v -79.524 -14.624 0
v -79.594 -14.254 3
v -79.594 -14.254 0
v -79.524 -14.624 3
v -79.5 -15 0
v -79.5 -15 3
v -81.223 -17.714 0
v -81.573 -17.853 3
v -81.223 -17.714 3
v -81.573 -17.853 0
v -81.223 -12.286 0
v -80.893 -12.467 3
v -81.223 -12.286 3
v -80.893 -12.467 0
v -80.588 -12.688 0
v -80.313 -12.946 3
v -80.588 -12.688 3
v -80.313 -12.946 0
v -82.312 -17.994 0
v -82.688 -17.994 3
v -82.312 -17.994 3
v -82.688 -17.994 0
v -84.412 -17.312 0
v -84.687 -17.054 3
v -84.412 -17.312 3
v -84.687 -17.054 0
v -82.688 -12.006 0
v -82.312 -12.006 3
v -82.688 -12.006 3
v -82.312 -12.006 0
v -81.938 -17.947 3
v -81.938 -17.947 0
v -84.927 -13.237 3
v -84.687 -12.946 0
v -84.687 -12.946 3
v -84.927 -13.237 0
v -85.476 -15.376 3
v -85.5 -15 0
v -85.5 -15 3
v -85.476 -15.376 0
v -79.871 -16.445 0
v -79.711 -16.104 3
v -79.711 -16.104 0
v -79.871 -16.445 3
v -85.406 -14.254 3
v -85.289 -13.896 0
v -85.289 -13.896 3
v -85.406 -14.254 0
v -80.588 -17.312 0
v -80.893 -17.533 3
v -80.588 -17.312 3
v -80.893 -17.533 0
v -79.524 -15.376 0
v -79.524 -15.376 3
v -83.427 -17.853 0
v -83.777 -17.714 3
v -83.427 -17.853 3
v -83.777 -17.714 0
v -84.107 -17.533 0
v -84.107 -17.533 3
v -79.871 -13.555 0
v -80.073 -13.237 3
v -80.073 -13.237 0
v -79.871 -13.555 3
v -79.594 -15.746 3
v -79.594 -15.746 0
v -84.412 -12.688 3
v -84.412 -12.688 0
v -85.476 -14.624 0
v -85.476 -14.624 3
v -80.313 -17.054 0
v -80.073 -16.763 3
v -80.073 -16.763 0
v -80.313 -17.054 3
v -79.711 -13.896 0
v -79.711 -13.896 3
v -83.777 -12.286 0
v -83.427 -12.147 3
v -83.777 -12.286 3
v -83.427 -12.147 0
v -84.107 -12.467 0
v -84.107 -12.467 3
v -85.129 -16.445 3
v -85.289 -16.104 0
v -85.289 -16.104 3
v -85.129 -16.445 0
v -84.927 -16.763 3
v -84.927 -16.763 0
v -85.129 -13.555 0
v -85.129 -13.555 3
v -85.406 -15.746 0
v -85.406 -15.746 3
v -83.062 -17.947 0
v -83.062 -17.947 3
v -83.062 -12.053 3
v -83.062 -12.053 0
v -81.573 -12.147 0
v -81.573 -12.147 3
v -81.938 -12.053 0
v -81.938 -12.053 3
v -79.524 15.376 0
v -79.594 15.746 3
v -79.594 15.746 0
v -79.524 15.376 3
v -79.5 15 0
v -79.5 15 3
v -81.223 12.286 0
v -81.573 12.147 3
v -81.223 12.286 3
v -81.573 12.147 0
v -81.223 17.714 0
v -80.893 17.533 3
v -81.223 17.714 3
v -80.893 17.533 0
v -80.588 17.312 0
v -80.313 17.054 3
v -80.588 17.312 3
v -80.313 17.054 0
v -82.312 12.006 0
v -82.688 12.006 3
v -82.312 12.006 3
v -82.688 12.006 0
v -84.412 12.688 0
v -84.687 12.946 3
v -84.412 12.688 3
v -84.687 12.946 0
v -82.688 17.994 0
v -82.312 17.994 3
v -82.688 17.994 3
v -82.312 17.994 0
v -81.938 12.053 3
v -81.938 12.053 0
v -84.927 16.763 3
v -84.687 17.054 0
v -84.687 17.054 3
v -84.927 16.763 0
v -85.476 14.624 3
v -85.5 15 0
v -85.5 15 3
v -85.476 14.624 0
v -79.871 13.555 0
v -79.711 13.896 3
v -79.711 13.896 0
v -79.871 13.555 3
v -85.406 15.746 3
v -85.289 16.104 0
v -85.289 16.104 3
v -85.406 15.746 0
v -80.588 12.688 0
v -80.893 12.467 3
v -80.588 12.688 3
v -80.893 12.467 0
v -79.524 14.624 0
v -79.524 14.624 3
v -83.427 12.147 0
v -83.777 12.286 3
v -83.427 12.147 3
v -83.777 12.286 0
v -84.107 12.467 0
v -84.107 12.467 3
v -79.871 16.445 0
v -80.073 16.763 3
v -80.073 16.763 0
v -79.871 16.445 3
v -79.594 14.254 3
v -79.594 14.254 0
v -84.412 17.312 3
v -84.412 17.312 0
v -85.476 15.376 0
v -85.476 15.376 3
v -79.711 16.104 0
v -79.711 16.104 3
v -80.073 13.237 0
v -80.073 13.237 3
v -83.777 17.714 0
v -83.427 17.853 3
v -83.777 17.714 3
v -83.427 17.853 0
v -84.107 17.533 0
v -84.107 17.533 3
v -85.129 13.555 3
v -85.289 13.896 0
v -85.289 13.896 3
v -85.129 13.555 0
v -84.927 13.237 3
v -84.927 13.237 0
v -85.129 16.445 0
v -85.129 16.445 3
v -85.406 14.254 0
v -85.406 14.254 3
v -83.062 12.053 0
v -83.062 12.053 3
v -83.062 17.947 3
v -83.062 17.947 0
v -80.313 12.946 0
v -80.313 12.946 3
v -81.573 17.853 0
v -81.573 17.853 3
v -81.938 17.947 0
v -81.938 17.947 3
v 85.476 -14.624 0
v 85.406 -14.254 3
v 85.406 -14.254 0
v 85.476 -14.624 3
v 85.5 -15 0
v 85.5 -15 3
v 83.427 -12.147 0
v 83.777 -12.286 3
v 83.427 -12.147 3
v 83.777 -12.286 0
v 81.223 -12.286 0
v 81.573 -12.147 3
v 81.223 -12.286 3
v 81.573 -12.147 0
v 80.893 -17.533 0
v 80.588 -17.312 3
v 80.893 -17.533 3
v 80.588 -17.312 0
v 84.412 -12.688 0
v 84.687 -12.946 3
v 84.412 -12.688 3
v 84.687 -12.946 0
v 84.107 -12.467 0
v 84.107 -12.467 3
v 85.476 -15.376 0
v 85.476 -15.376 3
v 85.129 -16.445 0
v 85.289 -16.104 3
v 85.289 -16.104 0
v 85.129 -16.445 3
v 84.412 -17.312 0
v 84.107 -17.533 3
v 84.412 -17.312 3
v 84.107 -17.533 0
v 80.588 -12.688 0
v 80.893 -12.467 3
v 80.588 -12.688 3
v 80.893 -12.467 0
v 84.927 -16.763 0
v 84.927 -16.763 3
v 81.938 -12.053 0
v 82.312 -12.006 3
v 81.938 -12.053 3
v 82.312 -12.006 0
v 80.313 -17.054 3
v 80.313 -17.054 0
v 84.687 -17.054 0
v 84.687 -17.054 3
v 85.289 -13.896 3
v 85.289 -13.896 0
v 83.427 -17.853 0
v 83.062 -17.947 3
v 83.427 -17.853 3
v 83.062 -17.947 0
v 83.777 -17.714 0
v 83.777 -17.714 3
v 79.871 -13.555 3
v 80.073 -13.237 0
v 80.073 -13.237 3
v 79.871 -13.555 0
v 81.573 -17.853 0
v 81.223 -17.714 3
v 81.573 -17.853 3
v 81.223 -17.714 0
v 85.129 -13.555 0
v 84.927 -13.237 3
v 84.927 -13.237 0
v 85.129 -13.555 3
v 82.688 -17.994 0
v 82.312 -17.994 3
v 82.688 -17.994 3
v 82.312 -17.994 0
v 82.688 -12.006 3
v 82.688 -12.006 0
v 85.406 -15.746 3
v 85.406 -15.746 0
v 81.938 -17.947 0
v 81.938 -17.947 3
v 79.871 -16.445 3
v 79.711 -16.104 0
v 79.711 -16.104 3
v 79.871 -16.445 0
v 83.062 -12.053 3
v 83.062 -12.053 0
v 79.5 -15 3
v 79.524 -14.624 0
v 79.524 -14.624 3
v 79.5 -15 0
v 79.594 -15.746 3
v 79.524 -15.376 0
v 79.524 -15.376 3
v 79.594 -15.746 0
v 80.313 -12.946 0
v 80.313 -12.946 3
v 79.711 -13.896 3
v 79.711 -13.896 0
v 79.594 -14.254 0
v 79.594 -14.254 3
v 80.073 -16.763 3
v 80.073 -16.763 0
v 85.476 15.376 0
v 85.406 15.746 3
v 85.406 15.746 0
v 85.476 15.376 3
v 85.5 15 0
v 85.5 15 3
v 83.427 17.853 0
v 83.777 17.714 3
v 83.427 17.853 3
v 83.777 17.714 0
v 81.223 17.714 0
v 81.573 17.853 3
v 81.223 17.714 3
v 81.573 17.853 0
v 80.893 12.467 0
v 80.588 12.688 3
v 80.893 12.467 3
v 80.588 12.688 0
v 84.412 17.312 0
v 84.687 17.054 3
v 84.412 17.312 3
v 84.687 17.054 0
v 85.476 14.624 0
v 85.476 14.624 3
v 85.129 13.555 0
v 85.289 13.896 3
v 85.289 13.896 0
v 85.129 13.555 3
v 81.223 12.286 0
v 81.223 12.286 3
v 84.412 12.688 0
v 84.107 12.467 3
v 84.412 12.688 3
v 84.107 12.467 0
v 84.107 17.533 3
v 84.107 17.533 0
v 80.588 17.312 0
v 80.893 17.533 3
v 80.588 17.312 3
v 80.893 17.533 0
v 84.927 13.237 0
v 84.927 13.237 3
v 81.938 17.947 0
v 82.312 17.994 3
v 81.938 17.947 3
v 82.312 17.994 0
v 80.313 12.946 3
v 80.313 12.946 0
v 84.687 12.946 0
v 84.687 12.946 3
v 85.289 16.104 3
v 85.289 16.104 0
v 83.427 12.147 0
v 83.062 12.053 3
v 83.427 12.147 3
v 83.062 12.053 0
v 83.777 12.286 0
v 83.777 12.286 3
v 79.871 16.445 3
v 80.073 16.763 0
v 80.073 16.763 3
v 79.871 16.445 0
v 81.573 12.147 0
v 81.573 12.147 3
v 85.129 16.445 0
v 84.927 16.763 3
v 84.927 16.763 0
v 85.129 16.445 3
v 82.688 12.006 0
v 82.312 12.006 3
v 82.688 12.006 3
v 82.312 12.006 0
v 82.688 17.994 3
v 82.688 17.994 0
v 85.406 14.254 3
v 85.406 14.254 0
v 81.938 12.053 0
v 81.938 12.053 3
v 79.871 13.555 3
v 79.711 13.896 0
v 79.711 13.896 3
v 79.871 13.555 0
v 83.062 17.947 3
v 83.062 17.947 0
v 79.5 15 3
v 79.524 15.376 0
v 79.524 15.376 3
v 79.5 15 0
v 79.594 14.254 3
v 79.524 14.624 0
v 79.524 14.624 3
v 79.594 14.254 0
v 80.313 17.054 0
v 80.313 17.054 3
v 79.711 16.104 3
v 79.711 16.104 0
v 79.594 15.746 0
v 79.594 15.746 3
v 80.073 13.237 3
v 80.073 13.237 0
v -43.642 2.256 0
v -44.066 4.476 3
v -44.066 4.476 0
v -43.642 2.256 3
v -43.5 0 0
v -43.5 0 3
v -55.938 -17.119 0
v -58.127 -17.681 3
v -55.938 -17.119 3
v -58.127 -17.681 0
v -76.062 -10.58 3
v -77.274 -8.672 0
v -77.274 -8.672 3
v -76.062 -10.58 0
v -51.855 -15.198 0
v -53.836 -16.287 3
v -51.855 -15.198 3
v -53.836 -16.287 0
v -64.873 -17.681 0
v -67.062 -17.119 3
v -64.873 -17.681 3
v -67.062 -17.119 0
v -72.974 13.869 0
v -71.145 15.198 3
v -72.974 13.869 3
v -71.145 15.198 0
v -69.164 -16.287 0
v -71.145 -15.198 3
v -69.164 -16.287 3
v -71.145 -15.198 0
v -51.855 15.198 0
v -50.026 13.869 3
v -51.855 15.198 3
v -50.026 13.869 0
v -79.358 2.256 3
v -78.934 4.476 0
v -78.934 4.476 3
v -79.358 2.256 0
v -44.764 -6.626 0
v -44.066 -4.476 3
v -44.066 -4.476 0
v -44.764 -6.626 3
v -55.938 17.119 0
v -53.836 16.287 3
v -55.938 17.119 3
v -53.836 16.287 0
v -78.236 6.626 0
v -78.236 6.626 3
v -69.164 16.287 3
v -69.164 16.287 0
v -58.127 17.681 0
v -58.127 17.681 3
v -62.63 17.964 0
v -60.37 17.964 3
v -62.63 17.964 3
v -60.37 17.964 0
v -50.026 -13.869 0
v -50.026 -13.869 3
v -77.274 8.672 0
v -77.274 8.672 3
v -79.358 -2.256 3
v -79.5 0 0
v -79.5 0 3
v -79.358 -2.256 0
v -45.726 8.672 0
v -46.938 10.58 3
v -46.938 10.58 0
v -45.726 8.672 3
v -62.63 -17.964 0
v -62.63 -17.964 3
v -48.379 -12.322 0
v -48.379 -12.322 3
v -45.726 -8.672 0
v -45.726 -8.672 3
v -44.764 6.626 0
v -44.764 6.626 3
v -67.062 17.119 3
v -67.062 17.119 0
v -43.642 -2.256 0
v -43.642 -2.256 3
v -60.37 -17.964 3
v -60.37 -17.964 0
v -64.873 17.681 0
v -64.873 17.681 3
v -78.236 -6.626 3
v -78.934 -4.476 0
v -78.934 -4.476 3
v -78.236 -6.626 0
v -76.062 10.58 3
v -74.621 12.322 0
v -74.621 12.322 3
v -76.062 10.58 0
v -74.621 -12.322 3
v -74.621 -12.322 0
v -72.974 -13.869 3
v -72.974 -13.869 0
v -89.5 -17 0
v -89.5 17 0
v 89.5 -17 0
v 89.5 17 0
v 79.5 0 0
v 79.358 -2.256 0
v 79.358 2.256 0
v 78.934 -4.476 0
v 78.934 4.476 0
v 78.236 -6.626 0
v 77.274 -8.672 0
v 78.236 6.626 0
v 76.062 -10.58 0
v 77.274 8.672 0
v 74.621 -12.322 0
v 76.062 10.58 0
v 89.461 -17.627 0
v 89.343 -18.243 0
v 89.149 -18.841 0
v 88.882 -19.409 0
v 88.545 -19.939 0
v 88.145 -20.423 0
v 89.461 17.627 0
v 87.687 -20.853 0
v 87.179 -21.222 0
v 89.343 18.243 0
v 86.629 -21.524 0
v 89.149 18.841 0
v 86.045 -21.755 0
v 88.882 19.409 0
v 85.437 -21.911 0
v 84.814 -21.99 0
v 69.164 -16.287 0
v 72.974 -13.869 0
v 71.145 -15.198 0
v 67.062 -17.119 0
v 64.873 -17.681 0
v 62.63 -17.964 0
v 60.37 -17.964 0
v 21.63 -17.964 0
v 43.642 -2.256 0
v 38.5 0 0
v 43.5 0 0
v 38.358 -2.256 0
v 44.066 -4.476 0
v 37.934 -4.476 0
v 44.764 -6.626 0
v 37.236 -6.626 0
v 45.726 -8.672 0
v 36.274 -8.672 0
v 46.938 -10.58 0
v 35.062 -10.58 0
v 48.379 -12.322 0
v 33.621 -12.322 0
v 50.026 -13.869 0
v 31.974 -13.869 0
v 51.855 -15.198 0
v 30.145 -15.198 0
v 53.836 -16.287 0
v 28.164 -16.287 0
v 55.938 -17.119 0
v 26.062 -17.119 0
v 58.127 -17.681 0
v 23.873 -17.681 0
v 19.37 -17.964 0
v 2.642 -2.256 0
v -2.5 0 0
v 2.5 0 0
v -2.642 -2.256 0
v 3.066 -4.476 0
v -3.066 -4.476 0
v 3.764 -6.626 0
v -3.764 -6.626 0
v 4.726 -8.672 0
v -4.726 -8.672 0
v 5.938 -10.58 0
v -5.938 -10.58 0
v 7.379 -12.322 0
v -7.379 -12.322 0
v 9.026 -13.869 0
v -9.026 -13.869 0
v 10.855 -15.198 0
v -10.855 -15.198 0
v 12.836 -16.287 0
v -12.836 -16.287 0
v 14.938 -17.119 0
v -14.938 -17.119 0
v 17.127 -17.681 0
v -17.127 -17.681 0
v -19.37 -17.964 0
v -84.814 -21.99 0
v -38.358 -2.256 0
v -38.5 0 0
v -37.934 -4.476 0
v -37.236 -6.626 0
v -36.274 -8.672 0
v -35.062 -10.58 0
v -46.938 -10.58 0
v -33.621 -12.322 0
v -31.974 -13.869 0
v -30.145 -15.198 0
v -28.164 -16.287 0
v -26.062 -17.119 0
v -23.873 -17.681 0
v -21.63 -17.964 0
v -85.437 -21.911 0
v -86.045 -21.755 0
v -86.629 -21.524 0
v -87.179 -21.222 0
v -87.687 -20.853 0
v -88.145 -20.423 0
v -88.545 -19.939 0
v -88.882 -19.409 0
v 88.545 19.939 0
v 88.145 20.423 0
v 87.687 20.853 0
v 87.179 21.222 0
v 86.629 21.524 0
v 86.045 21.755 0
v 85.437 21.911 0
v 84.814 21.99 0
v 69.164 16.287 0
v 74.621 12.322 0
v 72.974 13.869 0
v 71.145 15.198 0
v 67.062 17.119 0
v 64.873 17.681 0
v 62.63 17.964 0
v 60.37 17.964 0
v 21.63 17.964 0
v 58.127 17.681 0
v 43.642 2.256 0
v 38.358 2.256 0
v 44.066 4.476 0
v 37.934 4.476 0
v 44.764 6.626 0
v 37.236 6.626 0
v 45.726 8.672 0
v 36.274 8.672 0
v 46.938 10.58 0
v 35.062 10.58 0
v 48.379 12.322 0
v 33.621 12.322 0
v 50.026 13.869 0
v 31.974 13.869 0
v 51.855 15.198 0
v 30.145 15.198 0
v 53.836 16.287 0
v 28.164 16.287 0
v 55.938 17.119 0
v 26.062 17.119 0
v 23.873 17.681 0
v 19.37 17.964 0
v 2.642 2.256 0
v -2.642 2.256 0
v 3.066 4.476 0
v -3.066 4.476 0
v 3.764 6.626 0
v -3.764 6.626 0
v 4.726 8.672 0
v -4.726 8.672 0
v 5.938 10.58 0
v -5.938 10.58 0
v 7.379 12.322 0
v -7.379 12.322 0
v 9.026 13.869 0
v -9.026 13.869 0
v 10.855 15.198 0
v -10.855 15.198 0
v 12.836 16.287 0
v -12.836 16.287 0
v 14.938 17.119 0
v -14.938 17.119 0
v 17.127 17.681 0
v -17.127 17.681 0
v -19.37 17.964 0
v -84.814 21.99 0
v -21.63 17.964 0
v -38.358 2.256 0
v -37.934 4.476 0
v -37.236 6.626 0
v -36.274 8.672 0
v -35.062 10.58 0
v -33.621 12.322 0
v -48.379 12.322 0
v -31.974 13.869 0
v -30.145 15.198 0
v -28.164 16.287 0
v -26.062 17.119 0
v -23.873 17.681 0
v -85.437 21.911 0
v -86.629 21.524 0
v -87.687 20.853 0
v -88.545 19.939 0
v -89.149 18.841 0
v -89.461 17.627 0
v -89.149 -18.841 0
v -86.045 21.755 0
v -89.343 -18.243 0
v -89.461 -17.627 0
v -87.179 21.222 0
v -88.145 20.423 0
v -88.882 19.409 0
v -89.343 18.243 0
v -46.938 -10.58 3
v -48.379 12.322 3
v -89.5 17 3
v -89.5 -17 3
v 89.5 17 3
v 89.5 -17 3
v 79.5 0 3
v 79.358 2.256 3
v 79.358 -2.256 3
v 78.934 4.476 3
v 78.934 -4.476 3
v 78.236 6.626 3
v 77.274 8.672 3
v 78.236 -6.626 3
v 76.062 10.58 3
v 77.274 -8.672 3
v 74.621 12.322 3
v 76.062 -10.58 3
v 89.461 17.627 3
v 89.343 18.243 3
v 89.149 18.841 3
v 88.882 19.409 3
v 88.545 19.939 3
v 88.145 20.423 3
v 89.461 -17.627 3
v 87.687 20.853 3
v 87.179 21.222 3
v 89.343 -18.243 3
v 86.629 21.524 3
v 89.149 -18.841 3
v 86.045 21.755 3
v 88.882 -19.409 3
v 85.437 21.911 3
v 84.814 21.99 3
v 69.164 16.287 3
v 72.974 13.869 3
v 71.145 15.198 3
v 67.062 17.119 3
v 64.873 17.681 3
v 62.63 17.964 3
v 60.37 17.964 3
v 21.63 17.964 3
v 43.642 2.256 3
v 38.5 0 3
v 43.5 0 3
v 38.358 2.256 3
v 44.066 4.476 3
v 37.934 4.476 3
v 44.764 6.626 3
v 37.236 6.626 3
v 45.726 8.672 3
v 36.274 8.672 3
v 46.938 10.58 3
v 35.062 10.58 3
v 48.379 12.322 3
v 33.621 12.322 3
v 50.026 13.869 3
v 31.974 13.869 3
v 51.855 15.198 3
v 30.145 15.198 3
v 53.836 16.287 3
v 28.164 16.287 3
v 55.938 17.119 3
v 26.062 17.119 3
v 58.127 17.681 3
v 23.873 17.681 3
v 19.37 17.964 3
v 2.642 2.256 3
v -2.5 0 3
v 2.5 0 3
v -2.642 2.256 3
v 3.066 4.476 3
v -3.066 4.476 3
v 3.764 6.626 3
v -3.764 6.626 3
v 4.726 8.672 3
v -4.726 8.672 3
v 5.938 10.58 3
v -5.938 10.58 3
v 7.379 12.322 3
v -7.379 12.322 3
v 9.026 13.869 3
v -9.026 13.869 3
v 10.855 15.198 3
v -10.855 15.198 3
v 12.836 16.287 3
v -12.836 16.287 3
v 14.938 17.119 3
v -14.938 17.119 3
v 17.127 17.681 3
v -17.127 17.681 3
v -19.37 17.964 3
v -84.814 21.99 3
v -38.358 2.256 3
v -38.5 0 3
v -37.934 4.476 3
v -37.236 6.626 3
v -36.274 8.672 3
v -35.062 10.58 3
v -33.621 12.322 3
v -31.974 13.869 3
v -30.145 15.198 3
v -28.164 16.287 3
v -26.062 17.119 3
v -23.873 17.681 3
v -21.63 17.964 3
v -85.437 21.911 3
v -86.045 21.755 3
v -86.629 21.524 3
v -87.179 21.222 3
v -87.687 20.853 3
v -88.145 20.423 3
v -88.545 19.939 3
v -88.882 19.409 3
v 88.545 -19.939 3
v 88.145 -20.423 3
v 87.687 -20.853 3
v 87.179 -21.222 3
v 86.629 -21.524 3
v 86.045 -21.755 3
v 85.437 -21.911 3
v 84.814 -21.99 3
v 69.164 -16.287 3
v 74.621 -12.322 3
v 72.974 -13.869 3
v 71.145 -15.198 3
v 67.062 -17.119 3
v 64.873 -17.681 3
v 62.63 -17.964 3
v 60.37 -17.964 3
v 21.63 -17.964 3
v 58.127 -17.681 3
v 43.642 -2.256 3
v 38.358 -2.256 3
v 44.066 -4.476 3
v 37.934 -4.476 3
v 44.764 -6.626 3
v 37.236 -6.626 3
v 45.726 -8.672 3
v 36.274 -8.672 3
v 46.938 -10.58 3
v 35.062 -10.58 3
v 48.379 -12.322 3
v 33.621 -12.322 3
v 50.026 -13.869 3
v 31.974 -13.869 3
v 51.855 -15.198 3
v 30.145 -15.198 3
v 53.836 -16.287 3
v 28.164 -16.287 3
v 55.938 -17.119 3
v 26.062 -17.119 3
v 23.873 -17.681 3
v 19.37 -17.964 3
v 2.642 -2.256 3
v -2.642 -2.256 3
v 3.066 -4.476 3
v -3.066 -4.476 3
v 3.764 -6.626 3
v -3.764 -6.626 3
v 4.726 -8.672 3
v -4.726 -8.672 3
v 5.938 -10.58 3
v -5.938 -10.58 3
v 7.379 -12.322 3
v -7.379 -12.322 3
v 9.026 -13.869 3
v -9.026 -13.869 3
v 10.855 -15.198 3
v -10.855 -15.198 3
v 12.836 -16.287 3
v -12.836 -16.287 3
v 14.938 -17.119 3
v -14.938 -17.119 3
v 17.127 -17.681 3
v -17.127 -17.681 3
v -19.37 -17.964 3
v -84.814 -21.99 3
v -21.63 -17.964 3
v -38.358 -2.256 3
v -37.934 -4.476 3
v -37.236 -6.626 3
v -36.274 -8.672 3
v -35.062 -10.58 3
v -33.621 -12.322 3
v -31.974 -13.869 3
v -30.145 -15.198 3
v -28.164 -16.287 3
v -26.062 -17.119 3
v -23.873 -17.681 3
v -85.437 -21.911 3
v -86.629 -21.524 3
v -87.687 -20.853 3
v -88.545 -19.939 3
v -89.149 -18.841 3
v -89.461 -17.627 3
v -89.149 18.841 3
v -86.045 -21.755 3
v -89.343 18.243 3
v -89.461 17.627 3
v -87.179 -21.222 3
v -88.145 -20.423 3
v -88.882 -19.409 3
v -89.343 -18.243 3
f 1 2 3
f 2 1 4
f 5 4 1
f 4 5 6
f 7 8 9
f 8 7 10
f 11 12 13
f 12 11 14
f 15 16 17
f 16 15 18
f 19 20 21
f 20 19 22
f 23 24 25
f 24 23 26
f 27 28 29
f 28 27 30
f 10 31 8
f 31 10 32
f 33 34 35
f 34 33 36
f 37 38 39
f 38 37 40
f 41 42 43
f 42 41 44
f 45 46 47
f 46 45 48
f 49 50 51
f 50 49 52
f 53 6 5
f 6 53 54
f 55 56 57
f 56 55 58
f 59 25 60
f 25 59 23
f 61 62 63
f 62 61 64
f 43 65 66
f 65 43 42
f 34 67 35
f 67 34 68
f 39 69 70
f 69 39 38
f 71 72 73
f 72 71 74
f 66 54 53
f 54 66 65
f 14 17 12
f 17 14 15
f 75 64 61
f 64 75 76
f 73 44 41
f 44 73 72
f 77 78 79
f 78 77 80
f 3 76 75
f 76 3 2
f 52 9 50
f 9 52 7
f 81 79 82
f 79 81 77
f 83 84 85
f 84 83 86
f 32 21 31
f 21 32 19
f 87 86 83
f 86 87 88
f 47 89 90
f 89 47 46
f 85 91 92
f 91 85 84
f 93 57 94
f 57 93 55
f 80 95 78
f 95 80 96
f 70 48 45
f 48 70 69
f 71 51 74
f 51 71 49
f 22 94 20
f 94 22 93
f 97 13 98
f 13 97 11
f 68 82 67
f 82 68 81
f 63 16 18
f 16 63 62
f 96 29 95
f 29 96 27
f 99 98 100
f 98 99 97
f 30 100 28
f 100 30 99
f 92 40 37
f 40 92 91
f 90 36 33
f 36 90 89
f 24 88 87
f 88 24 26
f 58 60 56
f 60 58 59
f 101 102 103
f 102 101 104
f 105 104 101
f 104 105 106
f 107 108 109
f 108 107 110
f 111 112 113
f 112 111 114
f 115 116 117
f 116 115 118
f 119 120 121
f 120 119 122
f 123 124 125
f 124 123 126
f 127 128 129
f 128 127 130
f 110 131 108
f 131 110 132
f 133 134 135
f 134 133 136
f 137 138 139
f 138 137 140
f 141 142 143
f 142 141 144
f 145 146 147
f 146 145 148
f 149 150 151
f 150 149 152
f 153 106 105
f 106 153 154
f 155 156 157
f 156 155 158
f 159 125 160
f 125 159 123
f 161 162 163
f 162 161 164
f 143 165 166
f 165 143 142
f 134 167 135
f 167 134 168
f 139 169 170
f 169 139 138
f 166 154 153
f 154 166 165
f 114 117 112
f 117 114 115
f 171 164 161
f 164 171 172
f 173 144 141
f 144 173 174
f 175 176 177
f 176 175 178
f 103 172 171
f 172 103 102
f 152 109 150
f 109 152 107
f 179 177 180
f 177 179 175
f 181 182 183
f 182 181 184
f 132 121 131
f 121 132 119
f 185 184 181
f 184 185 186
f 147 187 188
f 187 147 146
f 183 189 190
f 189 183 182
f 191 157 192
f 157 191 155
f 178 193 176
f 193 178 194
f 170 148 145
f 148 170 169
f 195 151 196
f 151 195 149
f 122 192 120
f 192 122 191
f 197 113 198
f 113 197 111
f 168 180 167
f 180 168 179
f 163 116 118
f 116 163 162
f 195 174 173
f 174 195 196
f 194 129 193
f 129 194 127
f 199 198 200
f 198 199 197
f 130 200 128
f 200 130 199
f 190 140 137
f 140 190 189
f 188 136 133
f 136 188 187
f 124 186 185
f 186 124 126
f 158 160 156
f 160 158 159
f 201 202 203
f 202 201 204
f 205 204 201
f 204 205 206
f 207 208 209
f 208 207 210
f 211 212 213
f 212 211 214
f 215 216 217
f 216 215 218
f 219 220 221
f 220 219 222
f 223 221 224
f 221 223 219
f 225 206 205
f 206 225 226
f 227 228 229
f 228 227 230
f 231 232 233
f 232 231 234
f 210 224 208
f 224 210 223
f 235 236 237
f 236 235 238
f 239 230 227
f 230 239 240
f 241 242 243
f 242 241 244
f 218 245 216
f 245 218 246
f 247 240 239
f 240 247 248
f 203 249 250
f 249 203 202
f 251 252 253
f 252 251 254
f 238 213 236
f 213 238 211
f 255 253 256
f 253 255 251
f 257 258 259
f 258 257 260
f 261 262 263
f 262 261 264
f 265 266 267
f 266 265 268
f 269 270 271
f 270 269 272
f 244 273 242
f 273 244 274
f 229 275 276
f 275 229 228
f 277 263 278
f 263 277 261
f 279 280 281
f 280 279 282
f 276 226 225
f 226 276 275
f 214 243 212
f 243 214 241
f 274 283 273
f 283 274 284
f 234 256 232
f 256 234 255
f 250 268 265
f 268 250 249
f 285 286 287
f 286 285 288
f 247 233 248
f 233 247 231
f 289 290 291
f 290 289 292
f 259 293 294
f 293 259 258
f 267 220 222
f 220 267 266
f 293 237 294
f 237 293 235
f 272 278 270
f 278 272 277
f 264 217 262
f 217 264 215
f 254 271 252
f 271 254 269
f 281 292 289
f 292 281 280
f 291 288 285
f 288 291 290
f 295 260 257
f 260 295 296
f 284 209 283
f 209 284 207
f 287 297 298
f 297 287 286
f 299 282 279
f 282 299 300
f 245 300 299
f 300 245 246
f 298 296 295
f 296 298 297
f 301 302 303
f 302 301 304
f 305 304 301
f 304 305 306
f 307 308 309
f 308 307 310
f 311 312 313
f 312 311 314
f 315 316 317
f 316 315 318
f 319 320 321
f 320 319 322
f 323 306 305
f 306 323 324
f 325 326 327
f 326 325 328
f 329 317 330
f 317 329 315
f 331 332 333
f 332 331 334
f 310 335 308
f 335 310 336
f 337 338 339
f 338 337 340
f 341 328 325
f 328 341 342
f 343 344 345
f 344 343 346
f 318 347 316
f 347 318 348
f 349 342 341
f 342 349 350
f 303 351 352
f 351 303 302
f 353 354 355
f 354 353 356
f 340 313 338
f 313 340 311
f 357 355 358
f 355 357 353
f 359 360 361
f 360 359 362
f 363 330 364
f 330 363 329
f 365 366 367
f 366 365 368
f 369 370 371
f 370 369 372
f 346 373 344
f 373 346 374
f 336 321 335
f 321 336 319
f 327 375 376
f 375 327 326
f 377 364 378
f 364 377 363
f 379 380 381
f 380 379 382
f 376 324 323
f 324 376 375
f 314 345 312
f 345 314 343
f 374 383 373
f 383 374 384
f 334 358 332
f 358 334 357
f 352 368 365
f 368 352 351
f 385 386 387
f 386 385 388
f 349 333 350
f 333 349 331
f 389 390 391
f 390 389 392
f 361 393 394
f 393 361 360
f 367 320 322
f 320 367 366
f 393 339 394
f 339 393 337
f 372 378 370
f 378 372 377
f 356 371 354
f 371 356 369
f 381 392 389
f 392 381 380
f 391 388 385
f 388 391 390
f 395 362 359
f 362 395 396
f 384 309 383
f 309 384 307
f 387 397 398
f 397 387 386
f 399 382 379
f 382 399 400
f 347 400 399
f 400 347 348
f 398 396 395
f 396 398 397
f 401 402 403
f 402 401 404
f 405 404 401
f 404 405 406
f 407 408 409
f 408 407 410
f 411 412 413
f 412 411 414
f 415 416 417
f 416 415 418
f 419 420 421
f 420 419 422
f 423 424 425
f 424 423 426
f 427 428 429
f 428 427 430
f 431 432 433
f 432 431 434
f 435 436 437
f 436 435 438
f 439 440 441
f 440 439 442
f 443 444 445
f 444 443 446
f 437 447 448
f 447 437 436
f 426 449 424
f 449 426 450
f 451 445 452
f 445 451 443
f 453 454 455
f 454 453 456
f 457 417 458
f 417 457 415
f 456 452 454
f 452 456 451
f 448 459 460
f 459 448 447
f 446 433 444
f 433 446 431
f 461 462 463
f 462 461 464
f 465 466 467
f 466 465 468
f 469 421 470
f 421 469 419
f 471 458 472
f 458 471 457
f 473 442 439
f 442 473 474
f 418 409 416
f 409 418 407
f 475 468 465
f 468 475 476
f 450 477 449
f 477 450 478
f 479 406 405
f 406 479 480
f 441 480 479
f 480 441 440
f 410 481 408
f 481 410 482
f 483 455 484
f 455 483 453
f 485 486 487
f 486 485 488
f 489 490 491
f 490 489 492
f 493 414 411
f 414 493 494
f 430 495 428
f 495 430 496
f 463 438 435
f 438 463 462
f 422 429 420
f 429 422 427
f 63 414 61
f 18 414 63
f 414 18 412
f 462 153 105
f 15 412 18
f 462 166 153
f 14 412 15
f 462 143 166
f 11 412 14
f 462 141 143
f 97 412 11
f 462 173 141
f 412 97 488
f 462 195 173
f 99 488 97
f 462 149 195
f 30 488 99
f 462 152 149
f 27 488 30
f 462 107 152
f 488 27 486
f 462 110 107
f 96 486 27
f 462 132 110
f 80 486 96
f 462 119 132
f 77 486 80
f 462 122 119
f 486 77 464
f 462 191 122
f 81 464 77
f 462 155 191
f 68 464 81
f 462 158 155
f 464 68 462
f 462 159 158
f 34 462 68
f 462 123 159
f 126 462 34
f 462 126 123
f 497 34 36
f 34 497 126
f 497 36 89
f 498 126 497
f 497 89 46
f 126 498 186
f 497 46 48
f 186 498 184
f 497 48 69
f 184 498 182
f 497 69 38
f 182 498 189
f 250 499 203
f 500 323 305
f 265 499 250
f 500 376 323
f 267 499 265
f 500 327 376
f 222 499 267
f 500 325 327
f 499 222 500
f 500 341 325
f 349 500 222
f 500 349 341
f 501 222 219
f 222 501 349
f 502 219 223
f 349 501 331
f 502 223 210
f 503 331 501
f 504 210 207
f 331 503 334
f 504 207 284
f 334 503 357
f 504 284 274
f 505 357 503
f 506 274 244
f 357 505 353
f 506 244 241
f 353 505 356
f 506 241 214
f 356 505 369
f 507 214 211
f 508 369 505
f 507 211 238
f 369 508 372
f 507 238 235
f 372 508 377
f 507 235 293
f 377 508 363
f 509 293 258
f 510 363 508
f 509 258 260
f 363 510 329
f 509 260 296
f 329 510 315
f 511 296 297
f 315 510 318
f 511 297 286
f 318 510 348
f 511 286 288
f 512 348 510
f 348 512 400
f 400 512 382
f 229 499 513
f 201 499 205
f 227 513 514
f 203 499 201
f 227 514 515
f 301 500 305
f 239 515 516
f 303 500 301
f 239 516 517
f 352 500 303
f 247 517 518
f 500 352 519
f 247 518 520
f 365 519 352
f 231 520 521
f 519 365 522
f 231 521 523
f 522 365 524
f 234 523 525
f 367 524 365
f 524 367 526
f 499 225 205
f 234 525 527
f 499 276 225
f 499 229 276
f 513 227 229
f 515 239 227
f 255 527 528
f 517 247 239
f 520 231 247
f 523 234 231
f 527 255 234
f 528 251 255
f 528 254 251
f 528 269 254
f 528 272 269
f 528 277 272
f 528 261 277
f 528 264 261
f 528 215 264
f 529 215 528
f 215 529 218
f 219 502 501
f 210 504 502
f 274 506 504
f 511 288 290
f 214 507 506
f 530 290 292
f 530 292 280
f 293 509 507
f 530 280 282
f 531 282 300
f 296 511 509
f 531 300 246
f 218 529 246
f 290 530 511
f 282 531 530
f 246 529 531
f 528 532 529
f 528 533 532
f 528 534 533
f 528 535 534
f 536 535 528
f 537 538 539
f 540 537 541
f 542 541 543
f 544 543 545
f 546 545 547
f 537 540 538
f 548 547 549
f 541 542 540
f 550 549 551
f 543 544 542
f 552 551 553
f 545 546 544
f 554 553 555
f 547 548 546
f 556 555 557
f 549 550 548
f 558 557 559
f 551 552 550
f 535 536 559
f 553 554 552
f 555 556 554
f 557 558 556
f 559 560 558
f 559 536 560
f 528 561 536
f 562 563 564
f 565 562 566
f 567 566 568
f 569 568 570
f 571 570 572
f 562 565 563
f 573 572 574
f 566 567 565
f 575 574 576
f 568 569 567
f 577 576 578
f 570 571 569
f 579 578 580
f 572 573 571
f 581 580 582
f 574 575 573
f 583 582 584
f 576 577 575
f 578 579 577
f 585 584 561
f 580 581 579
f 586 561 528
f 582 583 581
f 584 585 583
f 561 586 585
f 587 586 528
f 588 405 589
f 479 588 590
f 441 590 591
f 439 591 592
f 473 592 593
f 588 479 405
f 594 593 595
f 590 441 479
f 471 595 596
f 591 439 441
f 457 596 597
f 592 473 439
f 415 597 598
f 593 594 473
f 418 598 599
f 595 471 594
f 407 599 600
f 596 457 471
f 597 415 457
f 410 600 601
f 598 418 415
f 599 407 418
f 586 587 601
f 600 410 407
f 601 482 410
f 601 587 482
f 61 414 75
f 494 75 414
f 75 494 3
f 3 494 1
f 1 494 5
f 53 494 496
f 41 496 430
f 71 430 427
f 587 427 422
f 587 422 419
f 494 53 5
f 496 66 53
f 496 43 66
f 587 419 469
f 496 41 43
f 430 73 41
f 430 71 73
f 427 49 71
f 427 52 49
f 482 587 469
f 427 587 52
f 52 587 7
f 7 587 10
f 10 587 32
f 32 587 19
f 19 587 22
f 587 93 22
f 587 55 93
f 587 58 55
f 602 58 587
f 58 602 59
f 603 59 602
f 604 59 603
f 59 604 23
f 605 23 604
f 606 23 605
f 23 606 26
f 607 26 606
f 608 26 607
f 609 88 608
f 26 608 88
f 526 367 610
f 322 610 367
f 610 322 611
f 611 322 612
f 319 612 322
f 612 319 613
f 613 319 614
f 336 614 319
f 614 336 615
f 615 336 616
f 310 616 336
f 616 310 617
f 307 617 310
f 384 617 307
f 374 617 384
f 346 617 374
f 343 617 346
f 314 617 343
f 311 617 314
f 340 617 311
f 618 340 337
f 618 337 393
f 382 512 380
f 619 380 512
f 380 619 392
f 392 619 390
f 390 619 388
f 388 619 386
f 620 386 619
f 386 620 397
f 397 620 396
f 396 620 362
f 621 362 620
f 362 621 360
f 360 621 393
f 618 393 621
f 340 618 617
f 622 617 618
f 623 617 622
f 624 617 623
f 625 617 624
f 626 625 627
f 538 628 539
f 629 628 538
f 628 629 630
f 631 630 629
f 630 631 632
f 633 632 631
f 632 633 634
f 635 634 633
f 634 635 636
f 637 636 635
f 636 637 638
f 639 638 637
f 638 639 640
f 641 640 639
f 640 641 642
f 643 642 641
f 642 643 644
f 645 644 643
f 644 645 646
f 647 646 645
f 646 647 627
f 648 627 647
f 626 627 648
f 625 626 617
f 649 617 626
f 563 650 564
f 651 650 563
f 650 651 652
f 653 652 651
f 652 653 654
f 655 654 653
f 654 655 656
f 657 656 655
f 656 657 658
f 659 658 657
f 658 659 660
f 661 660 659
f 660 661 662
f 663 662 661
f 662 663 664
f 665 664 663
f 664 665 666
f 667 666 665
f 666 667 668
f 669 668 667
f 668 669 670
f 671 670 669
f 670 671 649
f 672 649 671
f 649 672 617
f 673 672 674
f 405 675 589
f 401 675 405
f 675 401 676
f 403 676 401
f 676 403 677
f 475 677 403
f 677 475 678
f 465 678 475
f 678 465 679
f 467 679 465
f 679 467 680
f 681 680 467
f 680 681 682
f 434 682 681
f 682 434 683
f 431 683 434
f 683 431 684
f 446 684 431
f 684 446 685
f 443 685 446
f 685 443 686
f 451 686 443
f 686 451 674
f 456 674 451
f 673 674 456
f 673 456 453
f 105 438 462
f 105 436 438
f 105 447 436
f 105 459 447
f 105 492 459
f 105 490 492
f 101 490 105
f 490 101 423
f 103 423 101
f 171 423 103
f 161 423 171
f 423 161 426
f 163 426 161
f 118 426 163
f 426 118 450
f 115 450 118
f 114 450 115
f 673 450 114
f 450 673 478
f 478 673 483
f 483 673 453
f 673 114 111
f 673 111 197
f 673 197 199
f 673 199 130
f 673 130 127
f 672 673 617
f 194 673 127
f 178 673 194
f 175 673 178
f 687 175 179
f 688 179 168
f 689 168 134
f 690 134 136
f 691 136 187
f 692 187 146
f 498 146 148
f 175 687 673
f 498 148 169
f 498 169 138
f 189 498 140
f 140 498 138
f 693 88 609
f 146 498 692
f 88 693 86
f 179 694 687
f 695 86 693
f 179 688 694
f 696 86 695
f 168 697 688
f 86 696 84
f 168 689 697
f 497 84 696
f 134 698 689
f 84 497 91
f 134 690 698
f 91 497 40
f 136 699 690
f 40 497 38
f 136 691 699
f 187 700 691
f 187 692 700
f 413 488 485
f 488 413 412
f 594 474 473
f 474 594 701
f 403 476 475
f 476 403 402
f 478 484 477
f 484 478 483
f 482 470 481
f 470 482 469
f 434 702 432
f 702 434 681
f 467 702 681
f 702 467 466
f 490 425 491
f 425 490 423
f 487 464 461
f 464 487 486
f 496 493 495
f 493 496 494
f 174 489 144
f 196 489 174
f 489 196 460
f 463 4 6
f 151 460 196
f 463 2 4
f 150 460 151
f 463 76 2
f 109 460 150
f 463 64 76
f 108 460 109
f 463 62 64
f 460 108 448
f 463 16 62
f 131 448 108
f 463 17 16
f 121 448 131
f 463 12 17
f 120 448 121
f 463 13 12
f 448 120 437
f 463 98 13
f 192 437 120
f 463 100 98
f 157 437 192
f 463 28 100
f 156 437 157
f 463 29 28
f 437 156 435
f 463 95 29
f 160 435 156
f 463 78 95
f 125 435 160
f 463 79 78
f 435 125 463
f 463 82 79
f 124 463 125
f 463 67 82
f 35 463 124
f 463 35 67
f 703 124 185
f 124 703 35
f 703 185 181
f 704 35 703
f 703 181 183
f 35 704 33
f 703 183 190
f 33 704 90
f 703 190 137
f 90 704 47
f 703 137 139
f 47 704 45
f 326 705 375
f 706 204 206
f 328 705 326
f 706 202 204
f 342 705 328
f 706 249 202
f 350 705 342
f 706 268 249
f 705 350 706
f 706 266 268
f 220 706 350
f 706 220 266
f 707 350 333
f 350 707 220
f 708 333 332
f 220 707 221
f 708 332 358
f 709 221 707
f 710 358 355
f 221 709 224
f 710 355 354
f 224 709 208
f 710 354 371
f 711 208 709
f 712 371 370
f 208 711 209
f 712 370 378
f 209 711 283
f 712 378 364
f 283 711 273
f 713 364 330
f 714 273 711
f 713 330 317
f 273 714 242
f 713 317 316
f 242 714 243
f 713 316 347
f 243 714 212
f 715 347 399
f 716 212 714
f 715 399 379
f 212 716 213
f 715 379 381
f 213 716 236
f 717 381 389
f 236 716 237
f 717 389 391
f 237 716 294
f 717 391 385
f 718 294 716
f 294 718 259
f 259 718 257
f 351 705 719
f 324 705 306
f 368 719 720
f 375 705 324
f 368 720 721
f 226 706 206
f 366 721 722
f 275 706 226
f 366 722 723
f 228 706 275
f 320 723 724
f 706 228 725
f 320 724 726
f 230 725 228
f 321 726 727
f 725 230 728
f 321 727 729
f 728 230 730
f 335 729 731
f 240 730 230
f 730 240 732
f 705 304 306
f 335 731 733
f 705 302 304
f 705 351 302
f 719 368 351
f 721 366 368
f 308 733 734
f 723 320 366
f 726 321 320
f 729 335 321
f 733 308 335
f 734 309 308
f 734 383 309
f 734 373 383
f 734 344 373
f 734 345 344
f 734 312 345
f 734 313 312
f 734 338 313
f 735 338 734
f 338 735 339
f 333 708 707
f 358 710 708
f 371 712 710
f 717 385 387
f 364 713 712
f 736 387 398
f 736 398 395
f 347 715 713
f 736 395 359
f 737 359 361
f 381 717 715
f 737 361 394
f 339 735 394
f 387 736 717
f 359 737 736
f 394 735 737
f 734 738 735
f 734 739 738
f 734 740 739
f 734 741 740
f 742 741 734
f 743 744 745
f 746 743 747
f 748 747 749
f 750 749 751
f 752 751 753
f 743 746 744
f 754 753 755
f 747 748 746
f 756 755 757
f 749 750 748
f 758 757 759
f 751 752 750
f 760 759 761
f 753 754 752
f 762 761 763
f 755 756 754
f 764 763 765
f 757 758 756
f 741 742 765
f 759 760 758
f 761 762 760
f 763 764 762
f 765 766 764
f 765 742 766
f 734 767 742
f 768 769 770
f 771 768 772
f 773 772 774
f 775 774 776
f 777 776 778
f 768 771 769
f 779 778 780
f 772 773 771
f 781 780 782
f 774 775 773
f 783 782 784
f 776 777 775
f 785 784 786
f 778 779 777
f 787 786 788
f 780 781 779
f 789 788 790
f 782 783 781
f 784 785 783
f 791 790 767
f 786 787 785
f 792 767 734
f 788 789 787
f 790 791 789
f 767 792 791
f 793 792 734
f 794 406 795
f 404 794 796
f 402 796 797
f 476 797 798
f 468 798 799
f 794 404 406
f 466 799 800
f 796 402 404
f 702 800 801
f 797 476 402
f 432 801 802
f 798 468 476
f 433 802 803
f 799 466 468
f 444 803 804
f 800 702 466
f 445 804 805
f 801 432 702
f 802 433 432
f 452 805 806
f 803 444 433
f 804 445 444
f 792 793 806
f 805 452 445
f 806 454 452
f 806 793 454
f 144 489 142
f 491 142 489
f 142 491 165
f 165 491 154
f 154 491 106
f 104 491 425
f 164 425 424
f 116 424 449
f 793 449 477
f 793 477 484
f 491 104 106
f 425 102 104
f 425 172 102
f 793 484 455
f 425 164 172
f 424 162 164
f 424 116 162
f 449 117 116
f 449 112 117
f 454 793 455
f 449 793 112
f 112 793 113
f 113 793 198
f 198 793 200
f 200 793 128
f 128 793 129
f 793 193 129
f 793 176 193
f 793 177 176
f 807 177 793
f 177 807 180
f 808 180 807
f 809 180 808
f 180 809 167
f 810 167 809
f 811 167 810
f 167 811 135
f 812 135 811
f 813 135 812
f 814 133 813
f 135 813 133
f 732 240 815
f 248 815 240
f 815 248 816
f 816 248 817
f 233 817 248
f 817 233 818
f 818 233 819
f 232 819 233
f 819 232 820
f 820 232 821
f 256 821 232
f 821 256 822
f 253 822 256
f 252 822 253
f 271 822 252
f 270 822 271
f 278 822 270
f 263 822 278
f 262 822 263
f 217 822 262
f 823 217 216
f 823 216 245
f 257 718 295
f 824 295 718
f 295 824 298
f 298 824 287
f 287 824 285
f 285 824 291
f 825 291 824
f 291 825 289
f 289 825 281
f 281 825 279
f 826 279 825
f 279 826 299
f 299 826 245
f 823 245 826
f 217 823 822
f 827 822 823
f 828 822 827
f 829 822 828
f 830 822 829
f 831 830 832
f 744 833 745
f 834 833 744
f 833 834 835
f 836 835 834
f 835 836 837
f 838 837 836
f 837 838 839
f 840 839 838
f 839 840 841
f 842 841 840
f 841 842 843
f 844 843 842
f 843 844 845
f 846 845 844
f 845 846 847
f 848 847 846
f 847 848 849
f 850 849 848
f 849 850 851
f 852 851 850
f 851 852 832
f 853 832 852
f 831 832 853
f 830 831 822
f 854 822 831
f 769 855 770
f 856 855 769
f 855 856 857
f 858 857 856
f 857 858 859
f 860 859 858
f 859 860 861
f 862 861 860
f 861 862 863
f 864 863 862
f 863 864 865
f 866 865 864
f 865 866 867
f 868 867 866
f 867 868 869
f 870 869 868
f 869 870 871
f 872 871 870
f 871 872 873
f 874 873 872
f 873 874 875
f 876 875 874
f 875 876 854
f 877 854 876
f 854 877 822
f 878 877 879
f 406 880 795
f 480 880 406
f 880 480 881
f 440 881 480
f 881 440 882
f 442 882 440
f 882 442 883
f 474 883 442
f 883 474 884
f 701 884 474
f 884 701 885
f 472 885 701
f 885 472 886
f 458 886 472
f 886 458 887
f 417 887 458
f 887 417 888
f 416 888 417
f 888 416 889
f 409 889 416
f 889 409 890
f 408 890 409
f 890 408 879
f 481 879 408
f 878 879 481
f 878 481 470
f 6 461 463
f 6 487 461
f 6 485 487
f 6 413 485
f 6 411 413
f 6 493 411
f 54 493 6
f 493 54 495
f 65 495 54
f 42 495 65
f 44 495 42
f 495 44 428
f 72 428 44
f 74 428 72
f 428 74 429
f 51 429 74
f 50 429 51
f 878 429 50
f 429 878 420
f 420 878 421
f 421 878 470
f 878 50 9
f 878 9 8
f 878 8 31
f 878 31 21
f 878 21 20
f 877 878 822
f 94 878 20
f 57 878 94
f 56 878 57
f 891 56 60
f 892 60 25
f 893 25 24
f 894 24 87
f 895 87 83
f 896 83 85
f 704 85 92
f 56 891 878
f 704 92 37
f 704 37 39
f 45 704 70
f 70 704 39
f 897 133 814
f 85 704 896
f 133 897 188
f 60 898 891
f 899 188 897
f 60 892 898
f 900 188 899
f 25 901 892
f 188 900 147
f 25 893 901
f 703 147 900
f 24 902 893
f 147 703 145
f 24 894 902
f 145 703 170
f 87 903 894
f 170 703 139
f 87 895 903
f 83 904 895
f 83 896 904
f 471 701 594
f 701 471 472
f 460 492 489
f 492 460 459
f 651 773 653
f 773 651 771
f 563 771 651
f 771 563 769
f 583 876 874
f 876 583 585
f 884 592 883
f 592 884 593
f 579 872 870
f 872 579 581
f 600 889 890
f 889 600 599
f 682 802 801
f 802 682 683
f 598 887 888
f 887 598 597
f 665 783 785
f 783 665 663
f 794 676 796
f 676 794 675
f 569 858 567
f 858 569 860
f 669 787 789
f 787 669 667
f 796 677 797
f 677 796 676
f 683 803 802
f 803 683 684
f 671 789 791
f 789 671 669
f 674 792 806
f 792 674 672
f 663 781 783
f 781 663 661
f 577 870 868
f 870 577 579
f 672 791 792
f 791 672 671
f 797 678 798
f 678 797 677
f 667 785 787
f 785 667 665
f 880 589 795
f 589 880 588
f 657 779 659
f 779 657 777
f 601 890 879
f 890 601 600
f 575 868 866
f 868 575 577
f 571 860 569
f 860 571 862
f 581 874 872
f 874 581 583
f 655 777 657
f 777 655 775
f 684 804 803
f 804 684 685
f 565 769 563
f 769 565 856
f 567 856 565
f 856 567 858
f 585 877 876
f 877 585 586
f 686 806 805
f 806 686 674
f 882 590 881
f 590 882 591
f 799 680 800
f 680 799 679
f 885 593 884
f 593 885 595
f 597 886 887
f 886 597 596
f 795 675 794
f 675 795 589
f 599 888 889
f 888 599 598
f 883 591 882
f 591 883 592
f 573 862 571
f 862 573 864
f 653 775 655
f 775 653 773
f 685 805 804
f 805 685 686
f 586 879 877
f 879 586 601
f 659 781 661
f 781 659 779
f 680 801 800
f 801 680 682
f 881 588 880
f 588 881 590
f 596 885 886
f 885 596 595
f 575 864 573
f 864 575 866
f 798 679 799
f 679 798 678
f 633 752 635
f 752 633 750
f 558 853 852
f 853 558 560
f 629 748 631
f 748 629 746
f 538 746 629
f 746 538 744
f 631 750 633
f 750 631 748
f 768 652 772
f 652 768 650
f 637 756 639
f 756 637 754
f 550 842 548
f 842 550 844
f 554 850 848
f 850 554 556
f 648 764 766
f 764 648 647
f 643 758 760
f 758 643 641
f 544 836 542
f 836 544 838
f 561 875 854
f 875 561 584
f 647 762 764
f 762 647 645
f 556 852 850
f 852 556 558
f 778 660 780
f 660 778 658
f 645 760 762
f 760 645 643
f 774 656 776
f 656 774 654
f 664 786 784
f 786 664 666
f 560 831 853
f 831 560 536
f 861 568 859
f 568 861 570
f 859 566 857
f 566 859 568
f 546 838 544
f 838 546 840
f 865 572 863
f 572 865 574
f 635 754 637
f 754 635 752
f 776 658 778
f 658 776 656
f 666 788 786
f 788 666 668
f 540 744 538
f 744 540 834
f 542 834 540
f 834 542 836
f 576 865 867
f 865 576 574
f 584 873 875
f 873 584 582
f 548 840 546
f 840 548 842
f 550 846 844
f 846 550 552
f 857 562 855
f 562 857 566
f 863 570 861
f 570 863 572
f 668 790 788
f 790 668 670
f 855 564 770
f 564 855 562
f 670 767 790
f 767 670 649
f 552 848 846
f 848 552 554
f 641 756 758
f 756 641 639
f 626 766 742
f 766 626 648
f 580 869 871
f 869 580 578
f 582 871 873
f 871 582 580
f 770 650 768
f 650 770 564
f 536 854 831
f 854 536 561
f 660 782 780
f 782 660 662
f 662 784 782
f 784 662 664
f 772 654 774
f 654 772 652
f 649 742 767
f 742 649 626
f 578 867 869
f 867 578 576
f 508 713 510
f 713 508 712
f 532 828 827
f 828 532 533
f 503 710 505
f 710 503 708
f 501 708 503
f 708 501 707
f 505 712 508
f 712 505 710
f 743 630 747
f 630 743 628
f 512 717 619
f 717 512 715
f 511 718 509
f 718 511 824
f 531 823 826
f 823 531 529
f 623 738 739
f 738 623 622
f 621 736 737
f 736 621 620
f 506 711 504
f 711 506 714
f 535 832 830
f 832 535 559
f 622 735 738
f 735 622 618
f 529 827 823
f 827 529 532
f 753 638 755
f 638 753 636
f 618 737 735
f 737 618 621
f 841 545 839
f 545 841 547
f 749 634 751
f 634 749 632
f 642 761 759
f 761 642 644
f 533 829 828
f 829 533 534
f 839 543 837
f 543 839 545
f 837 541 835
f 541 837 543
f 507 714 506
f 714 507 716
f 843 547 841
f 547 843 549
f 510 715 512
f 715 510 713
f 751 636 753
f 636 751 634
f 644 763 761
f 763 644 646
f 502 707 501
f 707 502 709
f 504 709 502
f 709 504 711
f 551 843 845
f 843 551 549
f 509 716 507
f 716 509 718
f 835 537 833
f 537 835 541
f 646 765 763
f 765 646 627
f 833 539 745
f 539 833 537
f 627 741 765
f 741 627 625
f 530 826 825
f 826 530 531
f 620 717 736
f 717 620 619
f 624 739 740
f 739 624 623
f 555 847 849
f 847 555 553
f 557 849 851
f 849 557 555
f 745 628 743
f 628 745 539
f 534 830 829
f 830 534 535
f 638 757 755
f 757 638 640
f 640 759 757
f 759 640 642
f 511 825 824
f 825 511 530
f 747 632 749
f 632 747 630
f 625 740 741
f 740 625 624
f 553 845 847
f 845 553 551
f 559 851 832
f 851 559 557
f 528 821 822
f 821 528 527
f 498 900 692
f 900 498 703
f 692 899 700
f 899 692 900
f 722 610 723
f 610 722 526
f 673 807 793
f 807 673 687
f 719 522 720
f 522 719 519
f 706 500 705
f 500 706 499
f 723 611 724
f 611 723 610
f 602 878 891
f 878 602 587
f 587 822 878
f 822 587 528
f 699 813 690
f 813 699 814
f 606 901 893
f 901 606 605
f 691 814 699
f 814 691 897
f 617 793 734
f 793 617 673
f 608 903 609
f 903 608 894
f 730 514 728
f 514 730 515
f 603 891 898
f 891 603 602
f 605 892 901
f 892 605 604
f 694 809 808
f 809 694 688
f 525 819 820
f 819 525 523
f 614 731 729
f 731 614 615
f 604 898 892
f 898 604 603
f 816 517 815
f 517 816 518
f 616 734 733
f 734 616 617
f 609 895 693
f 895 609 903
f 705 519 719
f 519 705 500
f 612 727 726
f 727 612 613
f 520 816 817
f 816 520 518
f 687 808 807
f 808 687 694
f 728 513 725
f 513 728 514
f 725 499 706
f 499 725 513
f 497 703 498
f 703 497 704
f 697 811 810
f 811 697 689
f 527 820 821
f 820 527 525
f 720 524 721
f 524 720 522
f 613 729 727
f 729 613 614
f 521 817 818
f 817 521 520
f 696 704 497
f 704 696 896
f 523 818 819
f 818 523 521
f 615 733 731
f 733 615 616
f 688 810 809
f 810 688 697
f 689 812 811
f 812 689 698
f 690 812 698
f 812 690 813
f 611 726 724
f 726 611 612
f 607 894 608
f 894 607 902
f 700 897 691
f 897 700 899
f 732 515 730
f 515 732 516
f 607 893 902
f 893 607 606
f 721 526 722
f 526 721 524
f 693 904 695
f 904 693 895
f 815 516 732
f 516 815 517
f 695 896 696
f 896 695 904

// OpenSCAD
$fn = 50;


difference() {
	union() {
		hull() {
			translate(v = [-84.5000000000, 17.0000000000, 0]) {
				cylinder(h = 3, r = 5);
			}
			translate(v = [84.5000000000, 17.0000000000, 0]) {
				cylinder(h = 3, r = 5);
			}
			translate(v = [-84.5000000000, -17.0000000000, 0]) {
				cylinder(h = 3, r = 5);
			}
			translate(v = [84.5000000000, -17.0000000000, 0]) {
				cylinder(h = 3, r = 5);
			}
		}
	}
	union() {
		#translate(v = [-82.5000000000, -15.0000000000, -100.0000000000]) {
			cylinder(h = 200, r = 3.0000000000);
		}
		#translate(v = [-82.5000000000, 15.0000000000, -100.0000000000]) {
			cylinder(h = 200, r = 3.0000000000);
		}
		#translate(v = [82.5000000000, -15.0000000000, -100.0000000000]) {
			cylinder(h = 200, r = 3.0000000000);
		}
		#translate(v = [82.5000000000, 15.0000000000, -100.0000000000]) {
			cylinder(h = 200, r = 3.0000000000);
		}
		#translate(v = [-61.5000000000, 0, 0]) {
			cylinder(h = 3, r = 18.0000000000);
		}
		#translate(v = [-20.5000000000, 0, 0]) {
			cylinder(h = 3, r = 18.0000000000);
		}
		#translate(v = [20.5000000000, 0, 0]) {
			cylinder(h = 3, r = 18.0000000000);
		}
		#translate(v = [61.5000000000, 0, 0]) {
			cylinder(h = 3, r = 18.0000000000);
		}
	}
}
